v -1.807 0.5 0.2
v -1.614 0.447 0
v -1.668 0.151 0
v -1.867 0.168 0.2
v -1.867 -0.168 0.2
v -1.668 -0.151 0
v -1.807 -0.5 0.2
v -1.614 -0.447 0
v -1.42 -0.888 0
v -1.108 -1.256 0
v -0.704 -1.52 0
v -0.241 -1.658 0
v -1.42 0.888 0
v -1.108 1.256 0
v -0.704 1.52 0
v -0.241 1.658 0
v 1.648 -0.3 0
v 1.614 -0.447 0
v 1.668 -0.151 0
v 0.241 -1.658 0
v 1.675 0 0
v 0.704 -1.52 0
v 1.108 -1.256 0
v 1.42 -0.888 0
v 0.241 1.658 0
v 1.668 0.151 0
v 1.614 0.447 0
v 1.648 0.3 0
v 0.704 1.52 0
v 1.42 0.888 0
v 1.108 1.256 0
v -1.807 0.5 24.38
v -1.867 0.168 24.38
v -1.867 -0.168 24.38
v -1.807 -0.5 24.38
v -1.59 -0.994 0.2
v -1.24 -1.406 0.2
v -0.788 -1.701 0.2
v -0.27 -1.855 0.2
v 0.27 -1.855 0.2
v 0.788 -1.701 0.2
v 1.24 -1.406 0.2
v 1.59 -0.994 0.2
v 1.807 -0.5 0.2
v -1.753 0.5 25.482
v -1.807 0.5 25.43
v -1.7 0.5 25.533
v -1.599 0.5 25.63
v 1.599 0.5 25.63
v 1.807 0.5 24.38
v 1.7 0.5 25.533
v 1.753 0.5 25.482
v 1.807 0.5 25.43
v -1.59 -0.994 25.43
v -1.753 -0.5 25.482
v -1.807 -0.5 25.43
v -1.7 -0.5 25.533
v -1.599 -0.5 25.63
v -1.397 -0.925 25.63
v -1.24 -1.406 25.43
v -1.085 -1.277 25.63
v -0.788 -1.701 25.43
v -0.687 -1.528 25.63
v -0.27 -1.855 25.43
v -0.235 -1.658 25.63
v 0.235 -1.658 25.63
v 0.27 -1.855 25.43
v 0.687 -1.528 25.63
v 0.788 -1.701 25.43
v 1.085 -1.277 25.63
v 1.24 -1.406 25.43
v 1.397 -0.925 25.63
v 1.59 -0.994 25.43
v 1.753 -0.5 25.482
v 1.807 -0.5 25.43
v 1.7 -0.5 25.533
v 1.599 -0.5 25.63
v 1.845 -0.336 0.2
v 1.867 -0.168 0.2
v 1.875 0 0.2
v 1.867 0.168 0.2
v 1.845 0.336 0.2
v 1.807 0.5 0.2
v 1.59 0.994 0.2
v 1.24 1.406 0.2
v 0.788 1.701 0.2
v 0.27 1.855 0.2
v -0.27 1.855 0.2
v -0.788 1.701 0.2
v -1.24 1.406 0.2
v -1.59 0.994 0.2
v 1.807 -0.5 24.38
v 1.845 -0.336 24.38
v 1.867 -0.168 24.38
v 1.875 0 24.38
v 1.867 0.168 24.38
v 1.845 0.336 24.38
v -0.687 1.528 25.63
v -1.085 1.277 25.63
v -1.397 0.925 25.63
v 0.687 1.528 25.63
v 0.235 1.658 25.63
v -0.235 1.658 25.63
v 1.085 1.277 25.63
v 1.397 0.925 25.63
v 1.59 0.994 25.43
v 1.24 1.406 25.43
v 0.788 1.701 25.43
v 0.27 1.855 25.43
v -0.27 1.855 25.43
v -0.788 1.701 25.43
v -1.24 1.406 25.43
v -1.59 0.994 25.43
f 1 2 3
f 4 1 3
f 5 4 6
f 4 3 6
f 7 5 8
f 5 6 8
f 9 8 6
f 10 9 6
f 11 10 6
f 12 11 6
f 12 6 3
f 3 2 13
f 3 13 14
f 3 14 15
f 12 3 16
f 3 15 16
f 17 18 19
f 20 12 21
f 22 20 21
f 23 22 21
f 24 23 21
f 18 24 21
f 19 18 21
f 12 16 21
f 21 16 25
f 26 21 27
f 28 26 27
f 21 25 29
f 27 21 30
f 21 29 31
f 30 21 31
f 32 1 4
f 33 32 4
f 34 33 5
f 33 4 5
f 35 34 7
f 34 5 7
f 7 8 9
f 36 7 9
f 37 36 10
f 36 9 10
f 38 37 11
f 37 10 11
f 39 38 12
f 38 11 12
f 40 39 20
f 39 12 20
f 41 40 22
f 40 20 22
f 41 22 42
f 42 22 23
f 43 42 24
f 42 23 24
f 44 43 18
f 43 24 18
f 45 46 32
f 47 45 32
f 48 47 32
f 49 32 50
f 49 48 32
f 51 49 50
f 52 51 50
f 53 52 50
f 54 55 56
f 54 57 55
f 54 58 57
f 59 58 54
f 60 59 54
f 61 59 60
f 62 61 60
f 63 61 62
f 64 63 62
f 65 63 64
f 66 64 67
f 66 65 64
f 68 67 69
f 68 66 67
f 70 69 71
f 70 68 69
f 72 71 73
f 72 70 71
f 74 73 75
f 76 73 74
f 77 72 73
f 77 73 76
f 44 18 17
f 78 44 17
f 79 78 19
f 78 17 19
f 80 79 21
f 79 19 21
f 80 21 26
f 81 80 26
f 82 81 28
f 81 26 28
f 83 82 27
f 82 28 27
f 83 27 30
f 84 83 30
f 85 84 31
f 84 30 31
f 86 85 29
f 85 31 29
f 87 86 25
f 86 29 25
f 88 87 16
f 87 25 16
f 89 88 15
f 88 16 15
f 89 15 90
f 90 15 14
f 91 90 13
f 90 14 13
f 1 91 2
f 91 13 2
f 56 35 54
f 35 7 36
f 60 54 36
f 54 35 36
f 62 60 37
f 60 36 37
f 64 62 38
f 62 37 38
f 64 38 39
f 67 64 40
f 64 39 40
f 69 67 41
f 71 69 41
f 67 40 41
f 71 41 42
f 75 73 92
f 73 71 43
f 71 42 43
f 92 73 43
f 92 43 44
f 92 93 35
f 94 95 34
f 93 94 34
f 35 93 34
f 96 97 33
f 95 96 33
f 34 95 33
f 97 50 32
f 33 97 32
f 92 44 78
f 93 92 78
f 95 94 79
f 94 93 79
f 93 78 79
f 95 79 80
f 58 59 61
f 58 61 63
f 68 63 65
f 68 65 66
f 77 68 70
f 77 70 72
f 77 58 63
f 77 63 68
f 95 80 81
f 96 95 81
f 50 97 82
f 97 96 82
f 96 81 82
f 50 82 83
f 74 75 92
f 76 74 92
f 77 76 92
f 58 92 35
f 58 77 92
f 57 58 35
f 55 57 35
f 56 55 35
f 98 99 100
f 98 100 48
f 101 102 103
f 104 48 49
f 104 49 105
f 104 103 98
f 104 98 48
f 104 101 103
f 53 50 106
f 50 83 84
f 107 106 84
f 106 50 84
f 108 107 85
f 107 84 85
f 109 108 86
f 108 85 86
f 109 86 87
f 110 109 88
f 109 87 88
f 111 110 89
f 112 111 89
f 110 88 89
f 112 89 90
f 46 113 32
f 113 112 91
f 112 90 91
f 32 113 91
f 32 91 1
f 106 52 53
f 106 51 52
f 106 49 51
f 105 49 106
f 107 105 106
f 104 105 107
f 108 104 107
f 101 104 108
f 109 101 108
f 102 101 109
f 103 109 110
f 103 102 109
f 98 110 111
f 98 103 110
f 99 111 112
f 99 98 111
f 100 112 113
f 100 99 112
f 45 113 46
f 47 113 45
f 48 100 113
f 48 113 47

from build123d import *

# Parameters (mm, degrees)
BOSS_EXTRUDE1_DEPTH = 25.63
CUT_EXTRUDE1_DEPTH  = 1.25
CHAMFER1_SIZE       = 0.2
CHAMFER2_SIZE       = 0.2


with BuildPart() as part:
    # Sketch1 → Boss-Extrude1 (new body)
    with BuildSketch(Plane.XY):
        with BuildLine():
            ThreePointArc((1.807104037, 0.5), (0, 1.875), (-1.807104037, 0.5))
            Line((-1.807104037, 0.5), (1.807104037, 0.5))
        make_face()
        with BuildLine():
            Line((1.807104037, -0.5), (-1.807104037, -0.5))
            ThreePointArc((-1.807104037, -0.5), (0, -1.875), (1.807104037, -0.5))
        make_face()
        with BuildLine():
            Line((1.807104037, 0.5), (-1.807104037, 0.5))
            ThreePointArc((-1.807104037, 0.5), (-1.875, 0), (-1.807104037, -0.5))
            Line((-1.807104037, -0.5), (1.807104037, -0.5))
            ThreePointArc((1.807104037, -0.5), (1.857948475, -0.252294402), (1.875, 0))
            ThreePointArc((1.875, 0), (1.857948475, 0.252294402), (1.807104037, 0.5))
        make_face()
    extrude(amount=BOSS_EXTRUDE1_DEPTH)

    # Sketch2 → Cut-Extrude1 (cut)
    with BuildSketch(Plane.XY.offset(25.63)):
        with BuildLine():
            Line((-1.807104037, 0.5), (1.807104037, 0.5))
            ThreePointArc((1.807104037, 0.5), (1.875, 0), (1.807104037, -0.5))
            Line((1.807104037, -0.5), (-1.807104037, -0.5))
            ThreePointArc((-1.807104037, -0.5), (-1.875, 0), (-1.807104037, 0.5))
        make_face()
    extrude(amount=-CUT_EXTRUDE1_DEPTH, mode=Mode.SUBTRACT)

    # Chamfer1
    chamfer1_edges = [part.edges().sort_by_distance(p)[0] for p in [
        (0, 1.875, 25.63),
        (0, -1.875, 25.63),
    ]]
    chamfer(chamfer1_edges, length=CHAMFER1_SIZE)

    # Chamfer2
    chamfer2_edges = [part.edges().sort_by_distance(p)[0] for p in [
        (-1.807104037, 0.5, 0),
    ]]
    chamfer(chamfer2_edges, length=CHAMFER2_SIZE)


solid = part.part
